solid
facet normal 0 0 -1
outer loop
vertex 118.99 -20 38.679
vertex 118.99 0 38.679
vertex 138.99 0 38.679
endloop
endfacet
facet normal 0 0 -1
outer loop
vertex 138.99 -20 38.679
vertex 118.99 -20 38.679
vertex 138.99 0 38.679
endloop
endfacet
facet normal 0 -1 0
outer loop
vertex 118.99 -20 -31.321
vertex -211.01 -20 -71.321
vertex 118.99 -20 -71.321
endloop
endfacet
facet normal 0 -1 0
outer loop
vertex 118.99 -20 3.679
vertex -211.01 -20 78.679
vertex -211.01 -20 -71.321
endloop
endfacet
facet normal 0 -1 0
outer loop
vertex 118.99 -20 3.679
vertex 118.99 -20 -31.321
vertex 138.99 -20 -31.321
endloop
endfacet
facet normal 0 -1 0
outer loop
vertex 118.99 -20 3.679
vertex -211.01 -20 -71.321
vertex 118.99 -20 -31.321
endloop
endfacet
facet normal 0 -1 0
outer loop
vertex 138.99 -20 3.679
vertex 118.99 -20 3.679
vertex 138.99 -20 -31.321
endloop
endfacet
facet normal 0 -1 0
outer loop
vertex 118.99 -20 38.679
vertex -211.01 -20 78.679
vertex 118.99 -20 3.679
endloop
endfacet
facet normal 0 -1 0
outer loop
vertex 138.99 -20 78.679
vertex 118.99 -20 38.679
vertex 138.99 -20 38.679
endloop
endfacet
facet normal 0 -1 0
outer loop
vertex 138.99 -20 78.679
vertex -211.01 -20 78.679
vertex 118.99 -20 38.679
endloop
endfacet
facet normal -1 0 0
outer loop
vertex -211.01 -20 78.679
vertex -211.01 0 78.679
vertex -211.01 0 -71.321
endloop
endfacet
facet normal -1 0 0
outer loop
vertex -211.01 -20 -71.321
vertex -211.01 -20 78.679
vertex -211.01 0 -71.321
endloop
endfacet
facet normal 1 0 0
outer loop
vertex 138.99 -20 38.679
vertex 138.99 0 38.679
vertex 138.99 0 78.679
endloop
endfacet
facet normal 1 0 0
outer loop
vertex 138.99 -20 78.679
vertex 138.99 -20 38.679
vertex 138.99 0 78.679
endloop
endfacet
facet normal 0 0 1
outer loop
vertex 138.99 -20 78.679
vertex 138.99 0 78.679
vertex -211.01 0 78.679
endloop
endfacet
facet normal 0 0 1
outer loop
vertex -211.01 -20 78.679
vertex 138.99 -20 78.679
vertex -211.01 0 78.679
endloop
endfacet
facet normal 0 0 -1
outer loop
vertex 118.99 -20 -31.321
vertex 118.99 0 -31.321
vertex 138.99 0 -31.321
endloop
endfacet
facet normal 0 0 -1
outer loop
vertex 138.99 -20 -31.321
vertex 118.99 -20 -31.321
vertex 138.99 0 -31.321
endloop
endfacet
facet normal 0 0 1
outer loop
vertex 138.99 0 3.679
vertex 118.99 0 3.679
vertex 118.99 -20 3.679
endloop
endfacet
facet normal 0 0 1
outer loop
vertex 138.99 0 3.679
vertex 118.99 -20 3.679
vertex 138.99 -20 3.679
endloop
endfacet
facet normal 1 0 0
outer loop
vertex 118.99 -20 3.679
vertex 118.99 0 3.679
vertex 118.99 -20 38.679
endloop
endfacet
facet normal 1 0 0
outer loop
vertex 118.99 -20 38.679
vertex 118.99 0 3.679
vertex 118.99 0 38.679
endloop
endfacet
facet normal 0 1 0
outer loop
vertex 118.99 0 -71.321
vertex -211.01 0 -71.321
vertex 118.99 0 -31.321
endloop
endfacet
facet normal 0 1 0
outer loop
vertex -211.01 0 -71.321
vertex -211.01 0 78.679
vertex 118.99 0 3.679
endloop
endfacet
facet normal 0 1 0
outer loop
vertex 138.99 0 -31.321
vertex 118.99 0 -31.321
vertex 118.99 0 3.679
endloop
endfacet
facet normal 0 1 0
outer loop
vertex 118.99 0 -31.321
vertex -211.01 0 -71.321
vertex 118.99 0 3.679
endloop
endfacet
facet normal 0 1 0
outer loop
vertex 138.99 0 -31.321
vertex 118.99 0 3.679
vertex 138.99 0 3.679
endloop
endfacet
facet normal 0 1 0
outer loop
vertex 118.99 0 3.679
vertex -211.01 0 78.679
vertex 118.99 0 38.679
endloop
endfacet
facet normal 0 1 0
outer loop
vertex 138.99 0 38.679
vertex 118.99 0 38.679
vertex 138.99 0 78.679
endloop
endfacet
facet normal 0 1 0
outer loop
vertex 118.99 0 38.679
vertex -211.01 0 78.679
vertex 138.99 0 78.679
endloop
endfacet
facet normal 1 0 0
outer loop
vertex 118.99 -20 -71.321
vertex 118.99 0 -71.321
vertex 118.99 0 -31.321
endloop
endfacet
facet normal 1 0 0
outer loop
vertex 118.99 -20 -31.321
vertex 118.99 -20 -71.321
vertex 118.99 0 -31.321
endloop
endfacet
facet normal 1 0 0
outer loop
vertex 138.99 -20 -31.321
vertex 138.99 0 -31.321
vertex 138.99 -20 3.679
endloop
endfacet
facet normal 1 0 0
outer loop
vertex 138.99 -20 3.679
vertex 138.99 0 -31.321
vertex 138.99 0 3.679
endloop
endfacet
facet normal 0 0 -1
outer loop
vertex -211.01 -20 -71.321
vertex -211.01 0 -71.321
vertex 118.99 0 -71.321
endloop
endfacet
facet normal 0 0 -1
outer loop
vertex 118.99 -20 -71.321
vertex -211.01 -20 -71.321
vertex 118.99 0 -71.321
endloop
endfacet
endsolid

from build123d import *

# Parameters (mm, degrees)
F0_W     = 20
F0_H     = 40
F0_H_2   = 35
F1_DEPTH = 20


with BuildPart() as f1:
    # F0 (on Front) → F1 (new body)
    with BuildSketch(Plane.XZ):
        Polygon((118.989712, 78.679), (-211.010288, 78.679), (-211.010288, -71.321), (118.989712, -71.321), (118.989712, -31.321), (118.989712, 3.679), (118.989712, 38.679), align=None)
        with Locations((128.989712, 58.679)):
            Rectangle(F0_W, F0_H)
        with Locations((128.989712, -13.821)):
            Rectangle(F0_W, F0_H_2)
    extrude(amount=F1_DEPTH)


solid = f1.part
